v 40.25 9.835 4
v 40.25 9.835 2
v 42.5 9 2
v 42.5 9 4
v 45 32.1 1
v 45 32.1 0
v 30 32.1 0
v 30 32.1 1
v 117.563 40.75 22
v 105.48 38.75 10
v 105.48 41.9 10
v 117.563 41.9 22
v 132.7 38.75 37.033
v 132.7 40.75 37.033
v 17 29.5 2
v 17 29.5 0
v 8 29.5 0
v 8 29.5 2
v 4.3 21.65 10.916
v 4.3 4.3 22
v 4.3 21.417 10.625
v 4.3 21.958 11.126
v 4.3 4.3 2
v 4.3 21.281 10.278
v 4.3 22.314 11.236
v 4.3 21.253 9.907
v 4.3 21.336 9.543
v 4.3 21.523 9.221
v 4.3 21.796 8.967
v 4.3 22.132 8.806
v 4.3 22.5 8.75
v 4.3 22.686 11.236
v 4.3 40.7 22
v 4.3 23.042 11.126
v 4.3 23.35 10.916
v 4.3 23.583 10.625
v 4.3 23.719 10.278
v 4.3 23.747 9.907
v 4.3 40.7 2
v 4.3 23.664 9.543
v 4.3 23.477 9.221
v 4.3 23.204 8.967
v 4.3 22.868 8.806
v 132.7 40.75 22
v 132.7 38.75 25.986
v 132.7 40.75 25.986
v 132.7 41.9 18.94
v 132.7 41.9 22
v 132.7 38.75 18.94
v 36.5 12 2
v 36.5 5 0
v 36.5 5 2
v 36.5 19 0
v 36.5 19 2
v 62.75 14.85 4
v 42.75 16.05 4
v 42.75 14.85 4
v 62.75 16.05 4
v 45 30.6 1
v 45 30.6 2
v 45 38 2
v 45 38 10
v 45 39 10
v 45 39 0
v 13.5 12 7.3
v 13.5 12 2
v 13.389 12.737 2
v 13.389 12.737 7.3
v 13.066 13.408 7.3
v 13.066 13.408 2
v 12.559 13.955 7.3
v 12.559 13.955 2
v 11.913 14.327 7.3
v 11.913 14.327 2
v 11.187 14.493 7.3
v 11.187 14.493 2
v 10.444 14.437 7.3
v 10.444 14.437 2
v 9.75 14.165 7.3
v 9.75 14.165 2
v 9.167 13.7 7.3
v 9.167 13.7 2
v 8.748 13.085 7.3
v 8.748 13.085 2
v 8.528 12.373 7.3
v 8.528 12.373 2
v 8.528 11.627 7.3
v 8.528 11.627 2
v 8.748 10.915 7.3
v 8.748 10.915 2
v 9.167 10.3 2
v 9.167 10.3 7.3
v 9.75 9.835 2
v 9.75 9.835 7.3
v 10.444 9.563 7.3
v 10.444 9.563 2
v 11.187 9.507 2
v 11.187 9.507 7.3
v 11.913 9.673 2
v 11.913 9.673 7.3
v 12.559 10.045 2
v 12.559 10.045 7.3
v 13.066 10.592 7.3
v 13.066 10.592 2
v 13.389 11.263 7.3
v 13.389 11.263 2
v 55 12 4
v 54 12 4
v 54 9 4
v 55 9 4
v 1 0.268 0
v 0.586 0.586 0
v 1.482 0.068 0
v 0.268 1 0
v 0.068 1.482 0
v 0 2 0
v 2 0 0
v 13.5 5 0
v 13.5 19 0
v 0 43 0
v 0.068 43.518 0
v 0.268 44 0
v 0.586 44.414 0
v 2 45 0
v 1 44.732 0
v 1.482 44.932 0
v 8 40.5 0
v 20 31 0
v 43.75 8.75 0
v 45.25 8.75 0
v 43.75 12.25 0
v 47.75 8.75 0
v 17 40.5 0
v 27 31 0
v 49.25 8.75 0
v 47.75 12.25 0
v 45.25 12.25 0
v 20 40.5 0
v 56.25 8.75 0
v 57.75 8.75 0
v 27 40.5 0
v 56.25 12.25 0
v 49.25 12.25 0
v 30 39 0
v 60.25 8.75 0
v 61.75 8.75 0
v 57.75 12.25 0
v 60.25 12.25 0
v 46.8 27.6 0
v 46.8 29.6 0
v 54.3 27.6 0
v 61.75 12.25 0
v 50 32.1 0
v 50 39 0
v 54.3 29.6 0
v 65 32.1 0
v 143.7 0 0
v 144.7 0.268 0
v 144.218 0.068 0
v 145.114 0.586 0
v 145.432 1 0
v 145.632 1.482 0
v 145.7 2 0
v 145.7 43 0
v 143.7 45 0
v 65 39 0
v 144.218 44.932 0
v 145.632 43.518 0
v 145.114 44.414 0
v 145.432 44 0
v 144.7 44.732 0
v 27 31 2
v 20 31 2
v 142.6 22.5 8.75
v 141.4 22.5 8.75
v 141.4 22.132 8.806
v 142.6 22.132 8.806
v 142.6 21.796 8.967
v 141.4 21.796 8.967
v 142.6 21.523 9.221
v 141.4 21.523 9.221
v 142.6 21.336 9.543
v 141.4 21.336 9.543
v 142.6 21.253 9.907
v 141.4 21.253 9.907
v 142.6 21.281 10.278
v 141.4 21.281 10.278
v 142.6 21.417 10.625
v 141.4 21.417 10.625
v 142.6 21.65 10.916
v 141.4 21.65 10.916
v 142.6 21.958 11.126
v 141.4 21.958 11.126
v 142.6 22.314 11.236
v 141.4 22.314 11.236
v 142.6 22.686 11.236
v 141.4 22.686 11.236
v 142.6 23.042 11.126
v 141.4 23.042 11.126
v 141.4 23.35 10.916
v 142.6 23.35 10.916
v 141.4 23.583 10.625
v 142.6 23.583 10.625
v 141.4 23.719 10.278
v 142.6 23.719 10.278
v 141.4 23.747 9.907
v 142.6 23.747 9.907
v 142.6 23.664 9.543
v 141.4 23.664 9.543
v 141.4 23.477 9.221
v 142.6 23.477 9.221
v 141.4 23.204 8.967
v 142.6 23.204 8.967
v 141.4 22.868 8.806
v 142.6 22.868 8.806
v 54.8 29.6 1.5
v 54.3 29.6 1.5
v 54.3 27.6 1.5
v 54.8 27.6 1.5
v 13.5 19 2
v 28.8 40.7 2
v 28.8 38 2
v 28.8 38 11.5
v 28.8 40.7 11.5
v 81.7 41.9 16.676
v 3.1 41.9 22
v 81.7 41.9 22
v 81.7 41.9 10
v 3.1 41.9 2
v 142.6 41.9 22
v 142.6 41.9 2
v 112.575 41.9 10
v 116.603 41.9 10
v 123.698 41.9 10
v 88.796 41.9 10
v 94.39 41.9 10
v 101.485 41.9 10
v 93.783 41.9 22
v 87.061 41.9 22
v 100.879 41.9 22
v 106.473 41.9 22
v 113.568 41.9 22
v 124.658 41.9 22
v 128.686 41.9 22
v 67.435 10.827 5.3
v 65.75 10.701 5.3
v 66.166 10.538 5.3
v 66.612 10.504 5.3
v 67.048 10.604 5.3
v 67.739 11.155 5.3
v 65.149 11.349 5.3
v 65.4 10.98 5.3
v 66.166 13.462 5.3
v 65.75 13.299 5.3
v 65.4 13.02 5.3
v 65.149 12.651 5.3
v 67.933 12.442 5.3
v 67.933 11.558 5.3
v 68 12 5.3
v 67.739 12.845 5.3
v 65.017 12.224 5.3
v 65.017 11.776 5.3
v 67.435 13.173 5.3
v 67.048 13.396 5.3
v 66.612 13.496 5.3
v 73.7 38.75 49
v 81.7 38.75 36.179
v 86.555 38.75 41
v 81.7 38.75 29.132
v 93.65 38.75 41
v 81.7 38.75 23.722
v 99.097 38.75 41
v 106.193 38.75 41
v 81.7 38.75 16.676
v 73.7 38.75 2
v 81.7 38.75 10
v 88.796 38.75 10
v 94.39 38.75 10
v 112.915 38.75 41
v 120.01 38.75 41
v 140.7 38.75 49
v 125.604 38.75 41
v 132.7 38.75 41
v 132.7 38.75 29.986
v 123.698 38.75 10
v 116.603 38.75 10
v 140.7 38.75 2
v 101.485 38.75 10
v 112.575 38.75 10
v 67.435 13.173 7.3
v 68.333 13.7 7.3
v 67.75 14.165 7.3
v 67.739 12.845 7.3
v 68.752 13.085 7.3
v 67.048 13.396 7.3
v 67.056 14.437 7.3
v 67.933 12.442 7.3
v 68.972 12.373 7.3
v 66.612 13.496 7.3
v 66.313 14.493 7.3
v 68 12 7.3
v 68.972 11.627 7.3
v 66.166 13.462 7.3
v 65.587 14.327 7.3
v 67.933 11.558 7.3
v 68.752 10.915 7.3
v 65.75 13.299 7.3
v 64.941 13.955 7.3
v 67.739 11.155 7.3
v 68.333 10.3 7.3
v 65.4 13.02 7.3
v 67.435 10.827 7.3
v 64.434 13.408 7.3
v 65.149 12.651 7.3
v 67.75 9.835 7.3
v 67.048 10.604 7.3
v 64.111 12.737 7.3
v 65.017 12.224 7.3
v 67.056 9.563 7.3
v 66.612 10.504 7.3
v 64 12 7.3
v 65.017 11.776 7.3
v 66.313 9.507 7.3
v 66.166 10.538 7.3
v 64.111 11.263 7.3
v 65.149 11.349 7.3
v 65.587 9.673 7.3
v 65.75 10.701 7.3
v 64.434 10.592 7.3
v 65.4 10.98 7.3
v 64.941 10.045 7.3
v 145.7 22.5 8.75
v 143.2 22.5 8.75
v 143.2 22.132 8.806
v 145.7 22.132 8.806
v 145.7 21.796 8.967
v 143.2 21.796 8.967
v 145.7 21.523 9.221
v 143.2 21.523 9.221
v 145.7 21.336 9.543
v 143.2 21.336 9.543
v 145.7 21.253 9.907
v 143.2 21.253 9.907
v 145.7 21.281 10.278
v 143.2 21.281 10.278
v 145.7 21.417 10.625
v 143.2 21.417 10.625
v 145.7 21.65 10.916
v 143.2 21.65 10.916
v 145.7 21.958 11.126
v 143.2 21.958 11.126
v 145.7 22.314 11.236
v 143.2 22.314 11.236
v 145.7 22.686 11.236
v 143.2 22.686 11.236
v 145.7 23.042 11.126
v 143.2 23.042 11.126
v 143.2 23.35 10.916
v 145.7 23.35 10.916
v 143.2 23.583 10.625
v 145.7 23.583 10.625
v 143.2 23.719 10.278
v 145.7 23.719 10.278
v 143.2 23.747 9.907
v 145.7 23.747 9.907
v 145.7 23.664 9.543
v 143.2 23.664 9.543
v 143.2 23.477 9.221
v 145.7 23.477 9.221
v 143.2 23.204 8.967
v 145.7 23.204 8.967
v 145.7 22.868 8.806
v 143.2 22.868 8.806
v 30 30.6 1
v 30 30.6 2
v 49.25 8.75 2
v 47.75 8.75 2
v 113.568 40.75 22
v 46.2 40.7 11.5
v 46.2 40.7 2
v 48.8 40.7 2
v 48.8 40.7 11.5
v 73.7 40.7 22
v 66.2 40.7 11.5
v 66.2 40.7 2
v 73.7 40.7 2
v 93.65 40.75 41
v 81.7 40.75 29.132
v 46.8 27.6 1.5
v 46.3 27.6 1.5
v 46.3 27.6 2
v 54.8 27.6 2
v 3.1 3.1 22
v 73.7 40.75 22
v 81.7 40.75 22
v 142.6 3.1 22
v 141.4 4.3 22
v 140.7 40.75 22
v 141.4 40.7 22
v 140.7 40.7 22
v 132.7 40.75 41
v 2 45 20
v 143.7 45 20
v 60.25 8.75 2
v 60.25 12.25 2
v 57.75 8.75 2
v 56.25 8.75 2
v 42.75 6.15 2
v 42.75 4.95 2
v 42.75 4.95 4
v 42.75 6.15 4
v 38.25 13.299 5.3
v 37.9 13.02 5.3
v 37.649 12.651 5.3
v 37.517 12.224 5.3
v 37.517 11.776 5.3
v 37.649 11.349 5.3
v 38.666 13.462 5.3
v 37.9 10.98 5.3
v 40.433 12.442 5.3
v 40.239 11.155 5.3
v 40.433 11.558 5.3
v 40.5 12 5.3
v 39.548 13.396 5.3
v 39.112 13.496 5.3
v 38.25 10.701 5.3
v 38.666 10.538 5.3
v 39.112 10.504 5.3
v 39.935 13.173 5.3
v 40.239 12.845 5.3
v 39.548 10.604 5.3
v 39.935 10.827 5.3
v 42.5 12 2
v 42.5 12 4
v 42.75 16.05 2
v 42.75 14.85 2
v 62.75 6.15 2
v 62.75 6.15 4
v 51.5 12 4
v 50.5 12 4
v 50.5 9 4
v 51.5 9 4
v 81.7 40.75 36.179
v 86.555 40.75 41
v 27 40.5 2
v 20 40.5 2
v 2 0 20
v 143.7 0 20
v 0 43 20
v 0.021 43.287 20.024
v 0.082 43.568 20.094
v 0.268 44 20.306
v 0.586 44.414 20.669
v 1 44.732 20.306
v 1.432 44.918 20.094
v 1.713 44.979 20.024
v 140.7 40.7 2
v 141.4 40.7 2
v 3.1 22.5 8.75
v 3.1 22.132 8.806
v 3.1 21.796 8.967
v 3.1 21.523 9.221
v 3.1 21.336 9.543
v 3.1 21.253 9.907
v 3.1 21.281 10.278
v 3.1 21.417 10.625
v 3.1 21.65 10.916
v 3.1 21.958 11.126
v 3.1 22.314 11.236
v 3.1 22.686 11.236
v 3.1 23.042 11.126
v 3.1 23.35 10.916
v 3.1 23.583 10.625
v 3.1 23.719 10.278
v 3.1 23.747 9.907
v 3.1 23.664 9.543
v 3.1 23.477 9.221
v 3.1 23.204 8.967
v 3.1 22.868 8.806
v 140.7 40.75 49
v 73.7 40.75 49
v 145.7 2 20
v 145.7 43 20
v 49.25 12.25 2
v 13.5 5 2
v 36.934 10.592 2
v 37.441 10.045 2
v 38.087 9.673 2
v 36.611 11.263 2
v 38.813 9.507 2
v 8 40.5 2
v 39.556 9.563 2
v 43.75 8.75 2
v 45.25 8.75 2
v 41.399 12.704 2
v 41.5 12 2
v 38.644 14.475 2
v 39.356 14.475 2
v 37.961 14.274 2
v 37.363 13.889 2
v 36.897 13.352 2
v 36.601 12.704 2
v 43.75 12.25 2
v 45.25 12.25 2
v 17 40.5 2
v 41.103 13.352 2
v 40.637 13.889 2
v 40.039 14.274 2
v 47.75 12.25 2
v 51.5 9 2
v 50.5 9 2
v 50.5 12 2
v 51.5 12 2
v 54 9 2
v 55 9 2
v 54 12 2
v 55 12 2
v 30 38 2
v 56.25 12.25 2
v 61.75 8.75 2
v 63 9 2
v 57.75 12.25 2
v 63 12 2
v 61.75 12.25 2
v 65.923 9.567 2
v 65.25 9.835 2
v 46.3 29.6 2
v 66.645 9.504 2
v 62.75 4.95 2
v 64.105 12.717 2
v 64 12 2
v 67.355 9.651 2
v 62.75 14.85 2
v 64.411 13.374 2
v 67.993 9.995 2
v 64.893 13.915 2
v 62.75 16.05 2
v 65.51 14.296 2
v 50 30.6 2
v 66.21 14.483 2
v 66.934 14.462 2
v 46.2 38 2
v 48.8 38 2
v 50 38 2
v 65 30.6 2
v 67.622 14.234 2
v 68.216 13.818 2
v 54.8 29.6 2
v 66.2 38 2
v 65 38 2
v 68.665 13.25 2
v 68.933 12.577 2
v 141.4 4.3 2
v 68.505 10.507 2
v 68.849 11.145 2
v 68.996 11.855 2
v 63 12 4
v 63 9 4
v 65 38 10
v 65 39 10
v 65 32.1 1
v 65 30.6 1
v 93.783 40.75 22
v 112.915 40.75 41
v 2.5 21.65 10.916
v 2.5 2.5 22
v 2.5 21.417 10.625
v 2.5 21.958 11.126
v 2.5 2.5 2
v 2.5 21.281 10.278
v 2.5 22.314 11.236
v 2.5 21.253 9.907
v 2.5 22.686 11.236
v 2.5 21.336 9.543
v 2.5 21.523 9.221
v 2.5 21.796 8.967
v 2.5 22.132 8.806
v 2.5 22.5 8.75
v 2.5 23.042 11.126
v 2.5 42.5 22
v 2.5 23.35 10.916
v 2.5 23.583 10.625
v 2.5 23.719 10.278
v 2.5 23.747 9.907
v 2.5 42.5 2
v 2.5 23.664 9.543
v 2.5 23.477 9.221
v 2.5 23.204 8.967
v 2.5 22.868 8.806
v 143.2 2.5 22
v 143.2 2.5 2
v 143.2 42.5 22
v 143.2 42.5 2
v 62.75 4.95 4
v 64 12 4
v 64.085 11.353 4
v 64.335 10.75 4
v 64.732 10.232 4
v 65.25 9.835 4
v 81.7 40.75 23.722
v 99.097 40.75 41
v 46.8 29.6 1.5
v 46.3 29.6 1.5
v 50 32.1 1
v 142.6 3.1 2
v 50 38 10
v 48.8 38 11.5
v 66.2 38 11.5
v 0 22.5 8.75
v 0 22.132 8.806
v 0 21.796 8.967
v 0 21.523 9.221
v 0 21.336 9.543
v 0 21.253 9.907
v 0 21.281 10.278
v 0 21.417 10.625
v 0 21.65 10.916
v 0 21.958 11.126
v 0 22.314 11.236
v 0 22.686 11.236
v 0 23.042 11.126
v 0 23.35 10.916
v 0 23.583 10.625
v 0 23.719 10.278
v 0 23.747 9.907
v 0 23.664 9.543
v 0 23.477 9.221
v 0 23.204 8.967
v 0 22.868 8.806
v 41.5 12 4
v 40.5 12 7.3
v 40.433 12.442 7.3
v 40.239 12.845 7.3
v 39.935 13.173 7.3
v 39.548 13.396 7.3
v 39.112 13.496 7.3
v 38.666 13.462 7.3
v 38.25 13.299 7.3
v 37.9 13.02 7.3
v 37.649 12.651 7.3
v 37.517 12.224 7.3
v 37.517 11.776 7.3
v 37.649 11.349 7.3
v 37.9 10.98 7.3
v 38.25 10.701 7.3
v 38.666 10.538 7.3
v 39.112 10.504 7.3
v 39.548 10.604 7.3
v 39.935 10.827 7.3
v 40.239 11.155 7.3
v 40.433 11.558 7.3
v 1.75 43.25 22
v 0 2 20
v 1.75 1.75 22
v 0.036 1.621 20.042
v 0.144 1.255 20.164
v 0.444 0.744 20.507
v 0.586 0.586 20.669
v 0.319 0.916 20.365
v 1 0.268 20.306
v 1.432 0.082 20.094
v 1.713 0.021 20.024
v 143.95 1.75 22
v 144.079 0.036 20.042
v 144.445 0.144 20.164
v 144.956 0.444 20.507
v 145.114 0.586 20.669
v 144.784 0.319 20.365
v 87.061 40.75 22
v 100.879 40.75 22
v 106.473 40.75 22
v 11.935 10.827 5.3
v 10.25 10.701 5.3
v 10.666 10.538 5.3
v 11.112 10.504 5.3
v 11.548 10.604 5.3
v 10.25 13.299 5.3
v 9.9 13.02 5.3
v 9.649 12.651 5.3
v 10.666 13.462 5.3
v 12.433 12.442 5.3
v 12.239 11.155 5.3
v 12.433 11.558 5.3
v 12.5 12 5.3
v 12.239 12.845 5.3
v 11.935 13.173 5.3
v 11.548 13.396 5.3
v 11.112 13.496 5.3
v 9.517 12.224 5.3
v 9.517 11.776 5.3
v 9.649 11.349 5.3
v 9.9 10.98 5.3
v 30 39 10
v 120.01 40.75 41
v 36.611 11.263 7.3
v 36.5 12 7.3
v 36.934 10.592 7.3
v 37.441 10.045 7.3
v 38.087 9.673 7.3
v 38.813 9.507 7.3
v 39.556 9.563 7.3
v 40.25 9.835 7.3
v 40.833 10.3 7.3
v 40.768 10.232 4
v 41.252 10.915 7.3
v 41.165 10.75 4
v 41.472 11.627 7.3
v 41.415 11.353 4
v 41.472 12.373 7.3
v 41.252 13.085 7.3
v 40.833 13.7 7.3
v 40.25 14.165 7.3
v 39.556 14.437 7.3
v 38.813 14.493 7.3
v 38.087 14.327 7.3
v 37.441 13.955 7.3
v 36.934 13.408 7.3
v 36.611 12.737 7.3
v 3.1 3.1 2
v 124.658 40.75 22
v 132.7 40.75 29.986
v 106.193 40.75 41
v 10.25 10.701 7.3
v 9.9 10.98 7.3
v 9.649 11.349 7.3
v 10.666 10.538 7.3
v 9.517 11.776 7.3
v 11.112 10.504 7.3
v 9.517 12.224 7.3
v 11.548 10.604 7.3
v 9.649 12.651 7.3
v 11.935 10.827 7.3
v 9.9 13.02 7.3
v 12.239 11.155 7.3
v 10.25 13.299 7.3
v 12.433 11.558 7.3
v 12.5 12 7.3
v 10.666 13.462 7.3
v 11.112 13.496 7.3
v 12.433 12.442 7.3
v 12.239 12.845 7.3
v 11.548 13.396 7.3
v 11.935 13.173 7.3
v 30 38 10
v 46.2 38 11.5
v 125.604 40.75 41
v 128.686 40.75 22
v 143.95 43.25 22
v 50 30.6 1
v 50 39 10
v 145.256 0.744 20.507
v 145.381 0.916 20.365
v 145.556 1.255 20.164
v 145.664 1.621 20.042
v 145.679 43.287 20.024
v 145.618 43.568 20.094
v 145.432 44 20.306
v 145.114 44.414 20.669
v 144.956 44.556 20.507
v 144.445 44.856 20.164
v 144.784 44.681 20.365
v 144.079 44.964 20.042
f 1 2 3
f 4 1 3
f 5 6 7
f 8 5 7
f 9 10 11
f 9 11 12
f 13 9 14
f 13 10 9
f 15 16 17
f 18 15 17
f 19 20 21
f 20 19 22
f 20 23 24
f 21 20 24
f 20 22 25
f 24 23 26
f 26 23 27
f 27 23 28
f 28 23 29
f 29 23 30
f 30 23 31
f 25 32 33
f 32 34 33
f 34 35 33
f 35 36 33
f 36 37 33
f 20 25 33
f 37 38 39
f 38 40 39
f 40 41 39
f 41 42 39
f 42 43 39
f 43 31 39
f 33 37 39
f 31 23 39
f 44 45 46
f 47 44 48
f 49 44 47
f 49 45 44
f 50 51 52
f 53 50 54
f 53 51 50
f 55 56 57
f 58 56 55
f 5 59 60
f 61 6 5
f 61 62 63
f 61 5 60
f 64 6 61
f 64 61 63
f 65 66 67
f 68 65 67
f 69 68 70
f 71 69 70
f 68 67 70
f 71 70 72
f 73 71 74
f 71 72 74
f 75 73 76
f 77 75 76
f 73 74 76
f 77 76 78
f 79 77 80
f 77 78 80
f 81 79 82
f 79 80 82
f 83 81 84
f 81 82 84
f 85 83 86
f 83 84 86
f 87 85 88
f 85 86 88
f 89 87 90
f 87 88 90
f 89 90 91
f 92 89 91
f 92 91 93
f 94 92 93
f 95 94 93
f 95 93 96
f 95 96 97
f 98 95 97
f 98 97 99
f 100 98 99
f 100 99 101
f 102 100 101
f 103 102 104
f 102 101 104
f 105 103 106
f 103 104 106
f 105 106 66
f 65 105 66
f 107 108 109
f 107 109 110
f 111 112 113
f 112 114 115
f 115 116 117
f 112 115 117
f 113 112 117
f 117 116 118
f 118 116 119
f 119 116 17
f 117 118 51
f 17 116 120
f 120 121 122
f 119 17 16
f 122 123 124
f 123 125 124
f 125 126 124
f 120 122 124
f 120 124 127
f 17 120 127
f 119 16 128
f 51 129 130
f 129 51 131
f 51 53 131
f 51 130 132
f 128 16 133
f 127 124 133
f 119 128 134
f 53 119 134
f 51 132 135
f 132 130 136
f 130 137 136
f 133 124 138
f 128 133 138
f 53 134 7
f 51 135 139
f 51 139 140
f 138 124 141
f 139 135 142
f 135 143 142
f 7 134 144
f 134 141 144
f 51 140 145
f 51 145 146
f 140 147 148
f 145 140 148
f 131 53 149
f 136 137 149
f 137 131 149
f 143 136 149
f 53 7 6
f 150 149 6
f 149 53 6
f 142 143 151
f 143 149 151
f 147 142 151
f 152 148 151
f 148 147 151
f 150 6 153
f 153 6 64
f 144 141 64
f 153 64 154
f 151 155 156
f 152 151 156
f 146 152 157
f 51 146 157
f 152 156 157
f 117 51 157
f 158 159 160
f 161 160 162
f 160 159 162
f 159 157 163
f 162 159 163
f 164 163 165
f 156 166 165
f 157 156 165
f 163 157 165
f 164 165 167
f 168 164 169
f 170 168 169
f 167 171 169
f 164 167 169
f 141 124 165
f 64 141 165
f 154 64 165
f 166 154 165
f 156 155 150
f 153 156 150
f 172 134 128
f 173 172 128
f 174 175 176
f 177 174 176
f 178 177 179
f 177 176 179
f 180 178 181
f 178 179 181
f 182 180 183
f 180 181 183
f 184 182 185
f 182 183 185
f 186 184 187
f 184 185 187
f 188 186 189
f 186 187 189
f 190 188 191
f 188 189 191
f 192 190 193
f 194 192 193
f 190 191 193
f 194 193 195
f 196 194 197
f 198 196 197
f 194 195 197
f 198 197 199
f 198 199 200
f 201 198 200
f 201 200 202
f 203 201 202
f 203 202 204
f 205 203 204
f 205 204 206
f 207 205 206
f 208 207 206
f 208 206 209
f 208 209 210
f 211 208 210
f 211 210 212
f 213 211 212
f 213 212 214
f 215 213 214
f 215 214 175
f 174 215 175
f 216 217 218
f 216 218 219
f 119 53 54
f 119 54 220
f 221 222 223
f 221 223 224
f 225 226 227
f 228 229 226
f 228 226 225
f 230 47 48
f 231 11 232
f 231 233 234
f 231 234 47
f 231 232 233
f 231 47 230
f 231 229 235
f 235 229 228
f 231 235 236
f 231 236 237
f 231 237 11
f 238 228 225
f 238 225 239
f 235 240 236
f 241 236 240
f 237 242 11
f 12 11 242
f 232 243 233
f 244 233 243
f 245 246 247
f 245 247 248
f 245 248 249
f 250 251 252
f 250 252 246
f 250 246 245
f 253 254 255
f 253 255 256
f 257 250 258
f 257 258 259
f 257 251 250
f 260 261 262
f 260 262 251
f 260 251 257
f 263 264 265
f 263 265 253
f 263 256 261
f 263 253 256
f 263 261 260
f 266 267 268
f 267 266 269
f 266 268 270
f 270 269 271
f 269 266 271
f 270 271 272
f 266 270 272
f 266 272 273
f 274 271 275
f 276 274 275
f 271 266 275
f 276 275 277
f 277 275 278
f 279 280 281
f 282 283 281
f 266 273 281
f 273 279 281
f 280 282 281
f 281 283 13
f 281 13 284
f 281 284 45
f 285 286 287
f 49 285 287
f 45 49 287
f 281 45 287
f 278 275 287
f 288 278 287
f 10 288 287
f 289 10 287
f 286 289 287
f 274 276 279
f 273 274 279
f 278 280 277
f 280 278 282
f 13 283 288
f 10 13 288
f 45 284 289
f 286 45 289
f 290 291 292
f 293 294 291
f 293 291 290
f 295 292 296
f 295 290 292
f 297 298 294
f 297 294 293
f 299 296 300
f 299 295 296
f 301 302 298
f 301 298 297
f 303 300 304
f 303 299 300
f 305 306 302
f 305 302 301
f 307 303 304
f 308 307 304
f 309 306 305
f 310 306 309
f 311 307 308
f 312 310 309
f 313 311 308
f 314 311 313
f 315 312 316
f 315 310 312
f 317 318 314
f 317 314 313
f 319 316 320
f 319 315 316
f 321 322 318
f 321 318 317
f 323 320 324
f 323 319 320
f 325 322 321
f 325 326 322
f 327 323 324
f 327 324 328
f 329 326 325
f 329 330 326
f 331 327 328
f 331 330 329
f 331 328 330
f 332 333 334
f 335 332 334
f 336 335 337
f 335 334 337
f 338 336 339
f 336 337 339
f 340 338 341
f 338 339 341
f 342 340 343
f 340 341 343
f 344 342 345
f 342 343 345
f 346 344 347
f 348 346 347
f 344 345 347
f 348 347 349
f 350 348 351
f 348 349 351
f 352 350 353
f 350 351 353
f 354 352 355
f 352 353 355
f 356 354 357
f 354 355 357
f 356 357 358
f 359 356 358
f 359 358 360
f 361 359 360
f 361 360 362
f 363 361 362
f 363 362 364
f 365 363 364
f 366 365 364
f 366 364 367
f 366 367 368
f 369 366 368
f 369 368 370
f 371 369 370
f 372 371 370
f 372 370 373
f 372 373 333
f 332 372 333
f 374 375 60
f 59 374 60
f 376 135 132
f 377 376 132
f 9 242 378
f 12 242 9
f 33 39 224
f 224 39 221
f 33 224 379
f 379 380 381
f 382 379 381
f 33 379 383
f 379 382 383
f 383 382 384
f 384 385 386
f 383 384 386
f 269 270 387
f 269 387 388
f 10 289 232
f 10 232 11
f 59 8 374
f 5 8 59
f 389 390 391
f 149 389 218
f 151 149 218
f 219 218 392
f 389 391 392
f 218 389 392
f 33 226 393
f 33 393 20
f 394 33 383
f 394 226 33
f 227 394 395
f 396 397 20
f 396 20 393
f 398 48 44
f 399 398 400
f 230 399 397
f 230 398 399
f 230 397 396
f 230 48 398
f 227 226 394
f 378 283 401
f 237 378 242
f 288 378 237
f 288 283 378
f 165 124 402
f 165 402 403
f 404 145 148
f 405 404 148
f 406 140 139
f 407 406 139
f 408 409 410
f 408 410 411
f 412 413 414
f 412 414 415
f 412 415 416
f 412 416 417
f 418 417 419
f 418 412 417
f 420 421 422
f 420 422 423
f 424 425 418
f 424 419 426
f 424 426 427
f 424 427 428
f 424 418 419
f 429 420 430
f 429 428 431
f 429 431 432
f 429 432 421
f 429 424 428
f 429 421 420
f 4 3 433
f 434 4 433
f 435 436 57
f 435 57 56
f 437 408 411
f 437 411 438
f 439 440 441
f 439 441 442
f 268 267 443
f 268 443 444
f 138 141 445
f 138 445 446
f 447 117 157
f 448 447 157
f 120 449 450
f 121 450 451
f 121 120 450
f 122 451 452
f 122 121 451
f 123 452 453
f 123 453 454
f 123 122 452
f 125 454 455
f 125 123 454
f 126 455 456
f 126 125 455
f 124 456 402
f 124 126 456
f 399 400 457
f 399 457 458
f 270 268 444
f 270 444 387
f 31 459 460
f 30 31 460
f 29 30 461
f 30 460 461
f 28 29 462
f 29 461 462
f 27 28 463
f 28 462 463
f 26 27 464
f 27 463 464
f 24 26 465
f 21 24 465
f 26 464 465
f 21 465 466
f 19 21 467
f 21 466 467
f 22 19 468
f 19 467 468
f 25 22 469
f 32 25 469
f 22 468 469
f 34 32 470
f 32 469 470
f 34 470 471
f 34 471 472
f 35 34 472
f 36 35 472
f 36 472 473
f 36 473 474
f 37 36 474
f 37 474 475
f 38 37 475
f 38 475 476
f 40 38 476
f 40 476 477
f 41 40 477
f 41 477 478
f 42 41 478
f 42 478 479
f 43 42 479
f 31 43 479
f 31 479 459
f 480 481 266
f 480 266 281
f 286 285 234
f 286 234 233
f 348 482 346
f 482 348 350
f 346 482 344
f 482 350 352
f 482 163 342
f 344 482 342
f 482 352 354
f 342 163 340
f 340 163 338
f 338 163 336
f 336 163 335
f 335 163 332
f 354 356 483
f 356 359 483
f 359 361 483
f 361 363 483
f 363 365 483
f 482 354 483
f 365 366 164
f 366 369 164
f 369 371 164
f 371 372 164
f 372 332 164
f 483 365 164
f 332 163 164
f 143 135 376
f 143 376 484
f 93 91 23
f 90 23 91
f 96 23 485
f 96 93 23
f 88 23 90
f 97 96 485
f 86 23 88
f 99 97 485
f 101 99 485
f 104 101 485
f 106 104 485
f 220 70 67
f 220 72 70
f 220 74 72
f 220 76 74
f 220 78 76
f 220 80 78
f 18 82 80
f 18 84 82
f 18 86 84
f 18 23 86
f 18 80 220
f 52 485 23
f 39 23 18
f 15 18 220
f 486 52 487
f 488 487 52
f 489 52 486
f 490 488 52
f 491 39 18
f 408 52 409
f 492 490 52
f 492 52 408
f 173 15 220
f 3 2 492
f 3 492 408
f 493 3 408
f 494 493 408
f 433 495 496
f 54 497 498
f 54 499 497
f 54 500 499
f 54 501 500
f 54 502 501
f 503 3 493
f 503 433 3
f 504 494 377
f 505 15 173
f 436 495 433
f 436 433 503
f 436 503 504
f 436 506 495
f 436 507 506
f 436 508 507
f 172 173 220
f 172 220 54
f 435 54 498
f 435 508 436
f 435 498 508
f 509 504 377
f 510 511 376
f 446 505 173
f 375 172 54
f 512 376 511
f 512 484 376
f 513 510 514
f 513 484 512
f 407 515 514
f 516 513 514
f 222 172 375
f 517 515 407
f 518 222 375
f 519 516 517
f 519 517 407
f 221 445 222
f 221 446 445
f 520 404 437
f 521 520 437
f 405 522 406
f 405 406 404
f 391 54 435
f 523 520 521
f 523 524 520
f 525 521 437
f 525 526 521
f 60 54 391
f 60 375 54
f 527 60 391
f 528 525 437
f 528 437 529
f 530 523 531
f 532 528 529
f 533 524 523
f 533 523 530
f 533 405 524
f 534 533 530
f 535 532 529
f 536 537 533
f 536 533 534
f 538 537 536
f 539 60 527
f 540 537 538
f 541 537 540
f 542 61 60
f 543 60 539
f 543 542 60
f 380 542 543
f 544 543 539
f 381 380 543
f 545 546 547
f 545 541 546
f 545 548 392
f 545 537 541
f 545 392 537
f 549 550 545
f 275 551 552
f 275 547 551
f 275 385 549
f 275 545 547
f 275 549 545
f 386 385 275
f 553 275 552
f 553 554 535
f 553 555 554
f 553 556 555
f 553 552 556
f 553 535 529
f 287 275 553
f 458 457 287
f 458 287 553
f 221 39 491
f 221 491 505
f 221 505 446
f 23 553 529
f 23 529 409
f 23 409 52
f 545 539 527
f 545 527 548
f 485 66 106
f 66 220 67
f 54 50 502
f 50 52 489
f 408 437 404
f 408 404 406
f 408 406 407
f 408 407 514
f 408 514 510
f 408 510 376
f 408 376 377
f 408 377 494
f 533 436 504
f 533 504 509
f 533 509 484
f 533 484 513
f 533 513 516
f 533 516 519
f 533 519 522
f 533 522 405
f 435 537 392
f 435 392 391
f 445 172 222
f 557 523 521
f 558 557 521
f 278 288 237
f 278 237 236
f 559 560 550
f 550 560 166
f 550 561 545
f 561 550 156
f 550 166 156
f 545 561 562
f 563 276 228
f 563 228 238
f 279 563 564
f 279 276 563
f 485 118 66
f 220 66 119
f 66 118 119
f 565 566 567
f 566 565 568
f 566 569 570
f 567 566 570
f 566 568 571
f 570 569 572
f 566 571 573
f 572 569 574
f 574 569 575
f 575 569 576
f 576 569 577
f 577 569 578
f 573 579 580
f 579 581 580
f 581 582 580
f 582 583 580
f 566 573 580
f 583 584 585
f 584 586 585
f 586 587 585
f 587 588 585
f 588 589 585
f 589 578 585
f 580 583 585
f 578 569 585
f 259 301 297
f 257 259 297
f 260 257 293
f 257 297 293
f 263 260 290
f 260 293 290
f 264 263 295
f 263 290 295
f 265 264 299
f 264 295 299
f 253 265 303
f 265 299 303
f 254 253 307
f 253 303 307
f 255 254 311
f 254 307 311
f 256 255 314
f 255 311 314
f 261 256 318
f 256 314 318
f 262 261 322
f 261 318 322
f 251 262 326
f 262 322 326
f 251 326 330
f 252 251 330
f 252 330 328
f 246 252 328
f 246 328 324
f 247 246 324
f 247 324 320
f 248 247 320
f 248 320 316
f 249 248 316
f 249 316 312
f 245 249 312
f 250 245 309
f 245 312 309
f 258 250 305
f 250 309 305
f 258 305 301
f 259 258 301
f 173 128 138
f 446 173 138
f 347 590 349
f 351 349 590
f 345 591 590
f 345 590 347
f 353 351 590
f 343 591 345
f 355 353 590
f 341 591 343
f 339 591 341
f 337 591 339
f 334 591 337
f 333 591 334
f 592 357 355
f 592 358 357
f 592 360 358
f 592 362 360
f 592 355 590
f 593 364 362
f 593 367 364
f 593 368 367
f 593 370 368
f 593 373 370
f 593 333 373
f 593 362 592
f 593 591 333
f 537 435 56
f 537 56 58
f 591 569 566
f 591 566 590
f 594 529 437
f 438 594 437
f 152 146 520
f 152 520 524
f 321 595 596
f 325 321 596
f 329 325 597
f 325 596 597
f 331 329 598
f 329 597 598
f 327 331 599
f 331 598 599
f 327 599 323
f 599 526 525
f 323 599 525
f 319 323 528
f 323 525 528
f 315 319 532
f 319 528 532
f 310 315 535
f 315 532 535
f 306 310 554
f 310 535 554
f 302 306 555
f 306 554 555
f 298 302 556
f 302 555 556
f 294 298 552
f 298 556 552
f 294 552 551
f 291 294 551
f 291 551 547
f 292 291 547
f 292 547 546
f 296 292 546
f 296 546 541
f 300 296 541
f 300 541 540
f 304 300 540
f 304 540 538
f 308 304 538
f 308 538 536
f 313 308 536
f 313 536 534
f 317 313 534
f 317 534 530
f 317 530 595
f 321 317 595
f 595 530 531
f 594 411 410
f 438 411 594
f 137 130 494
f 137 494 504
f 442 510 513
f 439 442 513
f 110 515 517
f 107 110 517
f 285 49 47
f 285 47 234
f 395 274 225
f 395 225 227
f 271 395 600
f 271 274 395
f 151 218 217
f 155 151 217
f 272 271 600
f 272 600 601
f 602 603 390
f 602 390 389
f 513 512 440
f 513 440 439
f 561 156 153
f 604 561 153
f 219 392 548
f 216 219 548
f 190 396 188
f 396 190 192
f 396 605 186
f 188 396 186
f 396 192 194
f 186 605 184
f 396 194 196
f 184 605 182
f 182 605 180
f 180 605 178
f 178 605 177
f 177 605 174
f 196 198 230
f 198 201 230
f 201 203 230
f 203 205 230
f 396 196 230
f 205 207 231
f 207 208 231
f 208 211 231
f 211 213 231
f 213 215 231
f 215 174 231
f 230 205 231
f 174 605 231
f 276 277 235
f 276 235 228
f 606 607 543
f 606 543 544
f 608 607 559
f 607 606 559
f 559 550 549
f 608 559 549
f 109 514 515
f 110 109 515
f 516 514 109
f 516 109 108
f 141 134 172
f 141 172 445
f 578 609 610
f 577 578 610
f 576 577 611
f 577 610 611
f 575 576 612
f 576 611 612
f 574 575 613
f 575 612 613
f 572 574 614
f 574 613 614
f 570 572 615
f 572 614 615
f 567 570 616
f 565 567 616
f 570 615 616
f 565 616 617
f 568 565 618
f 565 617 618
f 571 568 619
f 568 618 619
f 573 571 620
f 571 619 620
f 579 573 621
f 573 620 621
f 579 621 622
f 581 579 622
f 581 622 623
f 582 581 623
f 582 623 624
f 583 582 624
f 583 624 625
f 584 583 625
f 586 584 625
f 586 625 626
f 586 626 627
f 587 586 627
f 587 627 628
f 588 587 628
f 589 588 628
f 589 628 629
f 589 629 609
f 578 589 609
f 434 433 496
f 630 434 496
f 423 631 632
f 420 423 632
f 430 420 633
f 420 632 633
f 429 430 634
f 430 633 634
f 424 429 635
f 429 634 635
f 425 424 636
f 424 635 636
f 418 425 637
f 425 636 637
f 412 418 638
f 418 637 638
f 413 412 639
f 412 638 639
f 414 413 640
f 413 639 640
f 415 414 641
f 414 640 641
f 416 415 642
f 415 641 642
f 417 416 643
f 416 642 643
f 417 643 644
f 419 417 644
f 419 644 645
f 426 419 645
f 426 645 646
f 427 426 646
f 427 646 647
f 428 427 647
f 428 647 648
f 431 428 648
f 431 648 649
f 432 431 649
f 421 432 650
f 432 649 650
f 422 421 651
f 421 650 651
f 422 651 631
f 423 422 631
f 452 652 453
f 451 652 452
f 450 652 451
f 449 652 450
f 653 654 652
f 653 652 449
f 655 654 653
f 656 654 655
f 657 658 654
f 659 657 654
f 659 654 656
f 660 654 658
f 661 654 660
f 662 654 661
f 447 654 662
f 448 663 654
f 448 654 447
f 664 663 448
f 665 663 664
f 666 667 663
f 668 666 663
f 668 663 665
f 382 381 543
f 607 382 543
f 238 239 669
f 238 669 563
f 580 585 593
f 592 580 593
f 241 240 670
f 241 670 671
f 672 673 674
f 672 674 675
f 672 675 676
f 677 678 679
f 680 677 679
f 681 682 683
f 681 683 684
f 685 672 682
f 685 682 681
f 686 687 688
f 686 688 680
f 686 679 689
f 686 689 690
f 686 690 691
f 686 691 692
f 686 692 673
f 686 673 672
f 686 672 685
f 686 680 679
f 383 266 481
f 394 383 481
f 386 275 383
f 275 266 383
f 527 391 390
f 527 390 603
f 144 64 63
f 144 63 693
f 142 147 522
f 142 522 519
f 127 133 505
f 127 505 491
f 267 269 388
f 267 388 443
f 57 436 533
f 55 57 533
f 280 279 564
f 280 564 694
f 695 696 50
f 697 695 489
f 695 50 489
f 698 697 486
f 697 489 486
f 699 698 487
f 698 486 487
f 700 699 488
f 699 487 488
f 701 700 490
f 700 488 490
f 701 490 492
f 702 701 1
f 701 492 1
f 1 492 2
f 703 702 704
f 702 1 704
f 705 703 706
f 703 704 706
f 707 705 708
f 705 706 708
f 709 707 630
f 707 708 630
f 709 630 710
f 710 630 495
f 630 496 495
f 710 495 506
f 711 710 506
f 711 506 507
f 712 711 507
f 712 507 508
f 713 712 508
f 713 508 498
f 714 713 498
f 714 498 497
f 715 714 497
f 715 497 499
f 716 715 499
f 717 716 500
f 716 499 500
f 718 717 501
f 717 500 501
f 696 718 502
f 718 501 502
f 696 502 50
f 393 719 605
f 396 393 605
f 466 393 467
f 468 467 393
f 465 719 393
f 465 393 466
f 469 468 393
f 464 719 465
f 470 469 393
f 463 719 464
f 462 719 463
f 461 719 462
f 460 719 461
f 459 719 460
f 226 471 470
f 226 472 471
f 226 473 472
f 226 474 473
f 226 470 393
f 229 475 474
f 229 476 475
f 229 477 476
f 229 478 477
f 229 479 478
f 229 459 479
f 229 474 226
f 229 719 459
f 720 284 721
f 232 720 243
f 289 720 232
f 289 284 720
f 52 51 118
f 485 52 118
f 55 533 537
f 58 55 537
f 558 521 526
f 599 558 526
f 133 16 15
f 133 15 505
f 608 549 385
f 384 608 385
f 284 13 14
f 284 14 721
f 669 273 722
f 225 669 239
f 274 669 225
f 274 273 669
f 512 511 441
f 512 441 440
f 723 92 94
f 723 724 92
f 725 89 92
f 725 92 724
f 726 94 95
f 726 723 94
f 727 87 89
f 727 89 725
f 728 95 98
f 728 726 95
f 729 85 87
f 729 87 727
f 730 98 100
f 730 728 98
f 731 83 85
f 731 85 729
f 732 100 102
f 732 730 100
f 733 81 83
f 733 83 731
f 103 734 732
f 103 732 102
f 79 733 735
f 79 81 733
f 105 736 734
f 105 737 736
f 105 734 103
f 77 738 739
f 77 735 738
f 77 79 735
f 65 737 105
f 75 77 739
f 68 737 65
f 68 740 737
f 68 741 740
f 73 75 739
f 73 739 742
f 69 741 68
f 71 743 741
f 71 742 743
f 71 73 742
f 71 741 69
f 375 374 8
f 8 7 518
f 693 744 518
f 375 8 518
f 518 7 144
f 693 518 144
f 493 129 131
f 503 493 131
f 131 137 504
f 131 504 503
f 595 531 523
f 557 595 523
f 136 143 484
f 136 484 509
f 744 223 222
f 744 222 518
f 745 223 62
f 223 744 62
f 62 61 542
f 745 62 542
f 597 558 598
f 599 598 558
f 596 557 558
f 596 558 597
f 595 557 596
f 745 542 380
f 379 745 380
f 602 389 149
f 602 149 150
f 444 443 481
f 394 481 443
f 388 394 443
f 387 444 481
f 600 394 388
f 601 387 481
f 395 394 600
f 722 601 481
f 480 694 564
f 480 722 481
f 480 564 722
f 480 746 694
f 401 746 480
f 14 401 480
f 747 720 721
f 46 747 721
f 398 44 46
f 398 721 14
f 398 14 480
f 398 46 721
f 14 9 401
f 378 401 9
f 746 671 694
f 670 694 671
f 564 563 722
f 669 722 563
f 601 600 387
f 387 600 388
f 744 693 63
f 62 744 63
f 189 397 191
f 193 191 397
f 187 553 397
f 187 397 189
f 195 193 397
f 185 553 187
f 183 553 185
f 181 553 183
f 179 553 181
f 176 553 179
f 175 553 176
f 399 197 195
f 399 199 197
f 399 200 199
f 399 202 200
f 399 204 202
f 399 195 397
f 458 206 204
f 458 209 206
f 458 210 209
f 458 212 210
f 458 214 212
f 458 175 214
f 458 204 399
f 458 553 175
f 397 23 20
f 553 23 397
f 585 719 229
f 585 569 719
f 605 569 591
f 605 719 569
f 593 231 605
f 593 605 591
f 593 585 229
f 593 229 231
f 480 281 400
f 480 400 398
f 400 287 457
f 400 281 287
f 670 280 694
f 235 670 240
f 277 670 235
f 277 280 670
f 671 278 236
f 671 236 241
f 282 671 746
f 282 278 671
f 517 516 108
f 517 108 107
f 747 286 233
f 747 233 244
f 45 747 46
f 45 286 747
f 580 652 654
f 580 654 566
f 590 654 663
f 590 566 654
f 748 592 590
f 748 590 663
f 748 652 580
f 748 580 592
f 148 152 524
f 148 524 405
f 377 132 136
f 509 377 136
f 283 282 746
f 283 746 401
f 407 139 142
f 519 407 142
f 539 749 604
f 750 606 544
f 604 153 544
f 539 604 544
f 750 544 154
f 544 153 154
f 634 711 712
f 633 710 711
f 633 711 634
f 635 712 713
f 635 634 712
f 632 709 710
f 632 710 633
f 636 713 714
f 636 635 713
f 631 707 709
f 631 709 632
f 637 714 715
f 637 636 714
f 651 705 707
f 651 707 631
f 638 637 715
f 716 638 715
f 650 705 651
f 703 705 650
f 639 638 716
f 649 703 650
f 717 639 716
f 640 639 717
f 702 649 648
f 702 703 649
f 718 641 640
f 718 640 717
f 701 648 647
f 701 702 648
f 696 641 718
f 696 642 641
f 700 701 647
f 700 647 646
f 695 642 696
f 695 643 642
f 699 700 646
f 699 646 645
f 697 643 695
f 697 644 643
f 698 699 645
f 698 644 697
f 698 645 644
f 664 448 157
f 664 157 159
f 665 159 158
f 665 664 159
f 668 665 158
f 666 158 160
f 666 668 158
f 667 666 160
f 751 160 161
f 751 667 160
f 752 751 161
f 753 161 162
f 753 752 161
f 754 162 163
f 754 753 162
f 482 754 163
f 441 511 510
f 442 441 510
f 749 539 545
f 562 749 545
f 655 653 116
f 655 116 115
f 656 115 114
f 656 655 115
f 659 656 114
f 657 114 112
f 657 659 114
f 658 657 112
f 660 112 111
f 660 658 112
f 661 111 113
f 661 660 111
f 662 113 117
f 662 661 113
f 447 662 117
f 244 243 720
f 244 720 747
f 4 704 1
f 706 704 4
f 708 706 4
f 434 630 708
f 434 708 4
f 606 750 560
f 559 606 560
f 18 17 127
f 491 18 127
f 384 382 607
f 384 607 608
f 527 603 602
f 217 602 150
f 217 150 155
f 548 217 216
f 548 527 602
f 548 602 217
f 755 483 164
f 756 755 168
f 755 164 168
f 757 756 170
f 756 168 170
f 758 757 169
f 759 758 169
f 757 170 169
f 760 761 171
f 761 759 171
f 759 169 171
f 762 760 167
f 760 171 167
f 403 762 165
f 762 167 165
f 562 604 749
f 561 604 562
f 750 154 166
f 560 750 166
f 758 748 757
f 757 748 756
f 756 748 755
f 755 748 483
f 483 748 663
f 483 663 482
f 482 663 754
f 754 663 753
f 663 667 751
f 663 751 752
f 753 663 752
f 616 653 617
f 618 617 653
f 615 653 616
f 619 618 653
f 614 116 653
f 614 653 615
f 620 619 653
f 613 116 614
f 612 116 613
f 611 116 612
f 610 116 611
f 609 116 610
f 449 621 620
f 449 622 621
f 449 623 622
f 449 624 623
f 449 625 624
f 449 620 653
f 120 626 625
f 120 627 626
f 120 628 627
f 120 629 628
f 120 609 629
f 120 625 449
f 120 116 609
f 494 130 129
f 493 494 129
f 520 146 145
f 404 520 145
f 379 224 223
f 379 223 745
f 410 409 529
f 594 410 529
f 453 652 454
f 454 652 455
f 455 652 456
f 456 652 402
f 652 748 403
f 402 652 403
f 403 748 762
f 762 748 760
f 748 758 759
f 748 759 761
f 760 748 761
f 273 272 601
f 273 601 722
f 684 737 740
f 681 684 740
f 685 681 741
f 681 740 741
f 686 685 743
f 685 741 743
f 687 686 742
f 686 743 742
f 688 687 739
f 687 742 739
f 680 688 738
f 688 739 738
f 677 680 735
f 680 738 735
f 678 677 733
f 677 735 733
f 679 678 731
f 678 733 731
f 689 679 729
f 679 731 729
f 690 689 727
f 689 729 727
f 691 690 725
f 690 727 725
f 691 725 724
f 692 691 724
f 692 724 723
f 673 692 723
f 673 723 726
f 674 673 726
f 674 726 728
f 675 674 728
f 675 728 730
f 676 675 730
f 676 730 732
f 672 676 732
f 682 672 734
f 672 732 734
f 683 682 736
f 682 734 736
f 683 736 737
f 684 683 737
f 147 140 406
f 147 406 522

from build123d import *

# Parameters (mm, degrees)
SKETCH1_W                = 145.7
SKETCH1_H                = 45
BOSS_EXTRUDE1_DEPTH      = 2
USB_REACH                = 154.504
SKETCH2_W                = 15
SKETCH2_H                = 6.9
SKETCH3_W                = 15
SKETCH3_H                = 8.4
USB_BACK_DEPTH           = 1
USB_BACK_SUPPORT_DEPTH   = 8
SKETCH5_W                = 17.4
SKETCH5_H                = 3
USB_BACK_SUPPORT_2_DEPTH = 1.5
VOLTMETER_HOLE_REACH     = 154.924
SKETCH6_W                = 23
SKETCH6_H                = 14
SKETCH7_R                = 2.5
VOLTMETER_PLOT_DEPTH     = 5.3
SKETCH10_R               = 1.5
PLOT_HOLE_DEPTH          = 2
SKETCH8_W                = 67
SKETCH8_H                = 2
BOSS_EXTRUDE5_DEPTH      = 47
DC_REACH                 = 162.17
SKETCH9_W                = 7
SKETCH9_H                = 9.5
SKETCH9_W_2              = 9
SKETCH9_H_2              = 11
SWITCH_HOLA_REACH        = 162.17
SKETCH11_W               = 1.5
SKETCH11_H               = 3.5
SKETCH12_W               = 20
SKETCH12_H               = 1.2
SKETCH12_W_2             = 1
SKETCH12_H_2             = 3
SWITCH_BLOCK_DEPTH       = 2
TROU_ROULETTE_REACH      = 161.57
SKETCH15_W               = 7.5
SKETCH15_H               = 2
SKETCH16_W               = 8.5
SKETCH16_H               = 2
CUT_EXTRUDE2_DEPTH       = 0.5
SKETCH17_W               = 145.7
SKETCH17_H               = 45
SKETCH17_W_2             = 140.7
SKETCH17_H_2             = 40
SKETCH17_W_3             = 139.5
SKETCH17_H_3             = 38.8
SKETCH17_W_4             = 137.1
SKETCH17_H_4             = 36.4
BORD_DEPTH               = 20
FILLET1_R                = 2
CUT_EXTRUDE3_REACH       = 160.528
CUT_EXTRUDE4_REACH       = 162.17
CUT_EXTRUDE5_REACH       = 162.17
CUT_EXTRUDE6_REACH       = 162.17
SKETCH21_R               = 1.25


with BuildPart() as part:
    # Sketch1 → Boss-Extrude1 (new body)
    with BuildSketch(Plane.XY):
        with Locations((72.85, 22.5)):
            Rectangle(SKETCH1_W, SKETCH1_H)
    extrude(amount=BOSS_EXTRUDE1_DEPTH)

    # Sketch2 → usb (cut, up to next)
    with BuildSketch(Plane(origin=(0, 0, 0), x_dir=(-1, 0, 0), z_dir=(0, 0, -1)), mode=Mode.PRIVATE) as usb_sk1:
        with Locations((-37.5, 35.55)):
            Rectangle(SKETCH2_W, SKETCH2_H)
    usb_tool1 = extrude(usb_sk1.sketch, amount=-USB_REACH, mode=Mode.PRIVATE) & part.part
    # Sketch2 → usb (cut, up to next)
    with BuildSketch(Plane(origin=(0, 0, 0), x_dir=(-1, 0, 0), z_dir=(0, 0, -1)), mode=Mode.PRIVATE) as usb_sk2:
        with Locations((-57.5, 35.55)):
            Rectangle(SKETCH2_W, SKETCH2_H)
    usb_tool2 = extrude(usb_sk2.sketch, amount=-USB_REACH, mode=Mode.PRIVATE) & part.part
    add(usb_tool1.solids().sort_by_distance((37.5, 35.55, 0))[0], mode=Mode.SUBTRACT)
    add(usb_tool2.solids().sort_by_distance((57.5, 35.55, 0))[0], mode=Mode.SUBTRACT)

    # Sketch3 → usb_back (cut)
    with BuildSketch(Plane.XY.offset(2)):
        with Locations((37.5, 34.8)):
            Rectangle(SKETCH3_W, SKETCH3_H)
        with Locations((57.5, 34.8)):
            Rectangle(SKETCH3_W, SKETCH3_H)
    extrude(amount=-USB_BACK_DEPTH, mode=Mode.SUBTRACT)

    # Sketch4 → usb_back_support (add)
    with BuildSketch(Plane.XY.offset(2)):
        Polygon((65, 39), (65, 38), (66.2, 38), (66.2, 41), (48.8, 41), (48.8, 38), (50, 38), (50, 39), align=None)
        Polygon((45, 39), (45, 38), (46.2, 38), (46.2, 41), (28.8, 41), (28.8, 38), (30, 38), (30, 39), align=None)
    extrude(amount=USB_BACK_SUPPORT_DEPTH)

    # Sketch5 → usb_back_support_2 (add)
    with BuildSketch(Plane.XY.offset(10)):
        with Locations((37.5, 39.5)):
            Rectangle(SKETCH5_W, SKETCH5_H)
        with Locations((57.5, 39.5)):
            Rectangle(SKETCH5_W, SKETCH5_H)
    extrude(amount=USB_BACK_SUPPORT_2_DEPTH)

    # Sketch6 → voltmeter_hole (cut, up to next)
    with BuildSketch(Plane(origin=(0, 0, 0), x_dir=(-1, 0, 0), z_dir=(0, 0, -1)), mode=Mode.PRIVATE) as voltmeter_hole_sk1:
        with Locations((-25, 12)):
            Rectangle(SKETCH6_W, SKETCH6_H)
    voltmeter_hole_tool1 = extrude(voltmeter_hole_sk1.sketch, amount=-VOLTMETER_HOLE_REACH, mode=Mode.PRIVATE) & part.part
    add(voltmeter_hole_tool1.solids().sort_by_distance((25, 12, 0))[0], mode=Mode.SUBTRACT)

    # Sketch7 → voltmeter_plot (add)
    with BuildSketch(Plane.XY.offset(2)):
        with Locations(Location((66.5, 12, 0), (0, 0, 180))):
            Circle(SKETCH7_R)
        with Locations(Location((39, 12, 0), (0, 0, 180))):
            Circle(SKETCH7_R)
        with Locations((11, 12)):
            Circle(SKETCH7_R)
    extrude(amount=VOLTMETER_PLOT_DEPTH)

    # Sketch10 → plot_hole (cut)
    with BuildSketch(Plane.XY.offset(7.3)):
        with Locations((66.5, 12)):
            Circle(SKETCH10_R)
        with Locations((39, 12)):
            Circle(SKETCH10_R)
        with Locations((11, 12)):
            Circle(SKETCH10_R)
    extrude(amount=-PLOT_HOLE_DEPTH, mode=Mode.SUBTRACT)

    # Sketch8 → Boss-Extrude5 (add)
    with BuildSketch(Plane.XY.offset(2)):
        with Locations((107.2, 39.75)):
            Rectangle(SKETCH8_W, SKETCH8_H)
    extrude(amount=BOSS_EXTRUDE5_DEPTH)

    # Sketch9 → dc (cut, up to next)
    with BuildSketch(Plane(origin=(0, 0, 0), x_dir=(-1, 0, 0), z_dir=(0, 0, -1)), mode=Mode.PRIVATE) as dc_sk1:
        with Locations((-23.5, 35.75)):
            Rectangle(SKETCH9_W, SKETCH9_H)
    dc_tool1 = extrude(dc_sk1.sketch, amount=-DC_REACH, mode=Mode.PRIVATE) & part.part
    # Sketch9 → dc (cut, up to next)
    with BuildSketch(Plane(origin=(0, 0, 0), x_dir=(-1, 0, 0), z_dir=(0, 0, -1)), mode=Mode.PRIVATE) as dc_sk2:
        with Locations((-12.5, 35)):
            Rectangle(SKETCH9_W_2, SKETCH9_H_2)
    dc_tool2 = extrude(dc_sk2.sketch, amount=-DC_REACH, mode=Mode.PRIVATE) & part.part
    add(dc_tool1.solids().sort_by_distance((23.5, 35.75, 0))[0], mode=Mode.SUBTRACT)
    add(dc_tool2.solids().sort_by_distance((12.5, 35, 0))[0], mode=Mode.SUBTRACT)

    # Sketch11 → switch_hola (cut, up to next)
    with BuildSketch(Plane(origin=(0, 0, 0), x_dir=(-1, 0, 0), z_dir=(0, 0, -1)), mode=Mode.PRIVATE) as switch_hola_sk1:
        with Locations((-44.5, 10.5)):
            Rectangle(SKETCH11_W, SKETCH11_H)
    switch_hola_tool1 = extrude(switch_hola_sk1.sketch, amount=-SWITCH_HOLA_REACH, mode=Mode.PRIVATE) & part.part
    # Sketch11 → switch_hola (cut, up to next)
    with BuildSketch(Plane(origin=(0, 0, 0), x_dir=(-1, 0, 0), z_dir=(0, 0, -1)), mode=Mode.PRIVATE) as switch_hola_sk2:
        with Locations((-48.5, 10.5)):
            Rectangle(SKETCH11_W, SKETCH11_H)
    switch_hola_tool2 = extrude(switch_hola_sk2.sketch, amount=-SWITCH_HOLA_REACH, mode=Mode.PRIVATE) & part.part
    # Sketch11 → switch_hola (cut, up to next)
    with BuildSketch(Plane(origin=(0, 0, 0), x_dir=(-1, 0, 0), z_dir=(0, 0, -1)), mode=Mode.PRIVATE) as switch_hola_sk3:
        with Locations((-57, 10.5)):
            Rectangle(SKETCH11_W, SKETCH11_H)
    switch_hola_tool3 = extrude(switch_hola_sk3.sketch, amount=-SWITCH_HOLA_REACH, mode=Mode.PRIVATE) & part.part
    # Sketch11 → switch_hola (cut, up to next)
    with BuildSketch(Plane(origin=(0, 0, 0), x_dir=(-1, 0, 0), z_dir=(0, 0, -1)), mode=Mode.PRIVATE) as switch_hola_sk4:
        with Locations((-61, 10.5)):
            Rectangle(SKETCH11_W, SKETCH11_H)
    switch_hola_tool4 = extrude(switch_hola_sk4.sketch, amount=-SWITCH_HOLA_REACH, mode=Mode.PRIVATE) & part.part
    add(switch_hola_tool1.solids().sort_by_distance((44.5, 10.5, 0))[0], mode=Mode.SUBTRACT)
    add(switch_hola_tool2.solids().sort_by_distance((48.5, 10.5, 0))[0], mode=Mode.SUBTRACT)
    add(switch_hola_tool3.solids().sort_by_distance((57, 10.5, 0))[0], mode=Mode.SUBTRACT)
    add(switch_hola_tool4.solids().sort_by_distance((61, 10.5, 0))[0], mode=Mode.SUBTRACT)

    # Sketch12 → switch_block (add)
    with BuildSketch(Plane.XY.offset(2)):
        with Locations((52.75, 15.45)):
            Rectangle(SKETCH12_W, SKETCH12_H)
        Polygon((65.25, 12), (63, 12), (63, 9), (65.25, 9.834936491), align=None)
        with Locations((54.5, 10.5)):
            Rectangle(SKETCH12_W_2, SKETCH12_H_2)
        with Locations((51, 10.5)):
            Rectangle(SKETCH12_W_2, SKETCH12_H_2)
        Polygon((42.5, 9), (42.5, 12), (40.25, 12), (40.25, 9.834936491), align=None)
        with Locations((52.75, 5.55)):
            Rectangle(SKETCH12_W, SKETCH12_H)
    extrude(amount=SWITCH_BLOCK_DEPTH)

    # Sketch15 → trou roulette (cut, up to next)
    with BuildSketch(Plane.XY.offset(2), mode=Mode.PRIVATE) as trou_roulette_sk1:
        with Locations((50.55, 28.6)):
            Rectangle(SKETCH15_W, SKETCH15_H)
    trou_roulette_tool1 = extrude(trou_roulette_sk1.sketch, amount=-TROU_ROULETTE_REACH, mode=Mode.PRIVATE) & part.part
    add(trou_roulette_tool1.solids().sort_by_distance((50.55, 28.6, 2))[0], mode=Mode.SUBTRACT)

    # Sketch16 → Cut-Extrude2 (cut)
    with BuildSketch(Plane.XY.offset(2)):
        with Locations((50.55, 28.6)):
            Rectangle(SKETCH16_W, SKETCH16_H)
    extrude(amount=-CUT_EXTRUDE2_DEPTH, mode=Mode.SUBTRACT)

    # Sketch17 → bord (add)
    # profile 1 of 2: a face of its own
    with BuildSketch(Plane.XY.offset(2)):
        with Locations((72.85, 22.5)):
            Rectangle(SKETCH17_W, SKETCH17_H)
        with Locations((72.85, 22.5)):
            Rectangle(SKETCH17_W_2, SKETCH17_H_2, mode=Mode.SUBTRACT)
    # profile 2 of 2: a face of its own
    with BuildSketch(Plane.XY.offset(2)):
        with Locations((72.85, 22.5)):
            Rectangle(SKETCH17_W_3, SKETCH17_H_3)
        with Locations((72.85, 22.5)):
            Rectangle(SKETCH17_W_4, SKETCH17_H_4, mode=Mode.SUBTRACT)
    extrude(amount=BORD_DEPTH)

    # Fillet1
    fillet1_edges = [part.edges().sort_by_distance(p)[0] for p in [
        (0, 45, 11),
        (145.7, 45, 11),
        (145.7, 0, 11),
        (0, 0, 11),
    ]]
    fillet(fillet1_edges, radius=FILLET1_R)

    # Cut-Extrude3: up to this face of the body (flat: up to its plane)
    cut_extrude3_end = Plane(part.part.faces().sort_by_distance((72.85, 41.9, 12))[0])
    # Sketch18 → Cut-Extrude3 (cut, up to the picked face)
    with BuildSketch(Plane.XZ.offset(-38.75), mode=Mode.PRIVATE) as cut_extrude3_sk1:
        Polygon((81.7, 36.178535443), (86.554874827, 41), (93.650484366, 41), (81.7, 29.131756459), align=None)
    cut_extrude3_tool1 = split(extrude(cut_extrude3_sk1.sketch, amount=-CUT_EXTRUDE3_REACH, mode=Mode.PRIVATE), bisect_by=cut_extrude3_end, keep=Keep.BOTH, mode=Mode.PRIVATE)
    # Sketch18 → Cut-Extrude3 (cut, up to the picked face)
    with BuildSketch(Plane.XZ.offset(-38.75), mode=Mode.PRIVATE) as cut_extrude3_sk2:
        Polygon((81.7, 23.722435448), (99.09728919, 41), (106.192898729, 41), (81.7, 16.675656464), align=None)
    cut_extrude3_tool2 = split(extrude(cut_extrude3_sk2.sketch, amount=-CUT_EXTRUDE3_REACH, mode=Mode.PRIVATE), bisect_by=cut_extrude3_end, keep=Keep.BOTH, mode=Mode.PRIVATE)
    # Sketch18 → Cut-Extrude3 (cut, up to the picked face)
    with BuildSketch(Plane.XZ.offset(-38.75), mode=Mode.PRIVATE) as cut_extrude3_sk3:
        Polygon((81.7, 10), (112.91481406, 41), (120.010423599, 41), (88.795609539, 10), align=None)
    cut_extrude3_tool3 = split(extrude(cut_extrude3_sk3.sketch, amount=-CUT_EXTRUDE3_REACH, mode=Mode.PRIVATE), bisect_by=cut_extrude3_end, keep=Keep.BOTH, mode=Mode.PRIVATE)
    # Sketch18 → Cut-Extrude3 (cut, up to the picked face)
    with BuildSketch(Plane.XZ.offset(-38.75), mode=Mode.PRIVATE) as cut_extrude3_sk4:
        Polygon((94.389576401, 10), (125.604390461, 41), (132.7, 41), (101.48518594, 10), align=None)
    cut_extrude3_tool4 = split(extrude(cut_extrude3_sk4.sketch, amount=-CUT_EXTRUDE3_REACH, mode=Mode.PRIVATE), bisect_by=cut_extrude3_end, keep=Keep.BOTH, mode=Mode.PRIVATE)
    # Sketch18 → Cut-Extrude3 (cut, up to the picked face)
    with BuildSketch(Plane.XZ.offset(-38.75), mode=Mode.PRIVATE) as cut_extrude3_sk5:
        Polygon((105.479535572, 10), (132.7, 37.033138678), (132.7, 29.986359693), (112.575145111, 10), align=None)
    cut_extrude3_tool5 = split(extrude(cut_extrude3_sk5.sketch, amount=-CUT_EXTRUDE3_REACH, mode=Mode.PRIVATE), bisect_by=cut_extrude3_end, keep=Keep.BOTH, mode=Mode.PRIVATE)
    # Sketch18 → Cut-Extrude3 (cut, up to the picked face)
    with BuildSketch(Plane.XZ.offset(-38.75), mode=Mode.PRIVATE) as cut_extrude3_sk6:
        Polygon((116.602863055, 10), (132.7, 25.986359693), (132.7, 18.939580709), (123.698472594, 10), align=None)
    cut_extrude3_tool6 = split(extrude(cut_extrude3_sk6.sketch, amount=-CUT_EXTRUDE3_REACH, mode=Mode.PRIVATE), bisect_by=cut_extrude3_end, keep=Keep.BOTH, mode=Mode.PRIVATE)
    add(cut_extrude3_tool1.solids().sort_by(Axis((86.151001, 38.75, 36.57963), (0, 1, 0)))[0], mode=Mode.SUBTRACT)
    add(cut_extrude3_tool2.solids().sort_by(Axis((92.272705, 38.75, 30.500054), (0, 1, 0)))[0], mode=Mode.SUBTRACT)
    add(cut_extrude3_tool3.solids().sort_by(Axis((100.855212, 38.75, 25.5), (0, 1, 0)))[0], mode=Mode.SUBTRACT)
    add(cut_extrude3_tool4.solids().sort_by(Axis((113.544788, 38.75, 25.5), (0, 1, 0)))[0], mode=Mode.SUBTRACT)
    add(cut_extrude3_tool5.solids().sort_by(Axis((120.775052, 38.75, 21.842883), (0, 1, 0)))[0], mode=Mode.SUBTRACT)
    add(cut_extrude3_tool6.solids().sort_by(Axis((126.258168, 38.75, 16.397501), (0, 1, 0)))[0], mode=Mode.SUBTRACT)

    # Cut-Extrude4: up to this face of the body (flat: up to its plane)
    cut_extrude4_end = Plane(part.part.faces().sort_by_distance((0, 22.5, 11))[0])
    # Sketch19 → Cut-Extrude4 (cut, up to the picked face)
    with BuildSketch(Plane(origin=(145.7, 0, 0), x_dir=(0, 0, -1), z_dir=(1, 0, 0)), mode=Mode.PRIVATE) as cut_extrude4_sk1:
        Polygon((-22, 43.25), (-20, 45), (-22, 45), align=None)
    cut_extrude4_tool1 = split(extrude(cut_extrude4_sk1.sketch, amount=-CUT_EXTRUDE4_REACH, mode=Mode.PRIVATE), bisect_by=cut_extrude4_end, keep=Keep.BOTH, mode=Mode.PRIVATE)
    # Sketch19 → Cut-Extrude4 (cut, up to the picked face)
    with BuildSketch(Plane(origin=(145.7, 0, 0), x_dir=(0, 0, -1), z_dir=(1, 0, 0)), mode=Mode.PRIVATE) as cut_extrude4_sk2:
        Polygon((-22, 1.75), (-20, 0), (-22, 0), align=None)
    cut_extrude4_tool2 = split(extrude(cut_extrude4_sk2.sketch, amount=-CUT_EXTRUDE4_REACH, mode=Mode.PRIVATE), bisect_by=cut_extrude4_end, keep=Keep.BOTH, mode=Mode.PRIVATE)
    add(cut_extrude4_tool1.solids().sort_by(Axis((145.7, 44.416667, 21.333333), (-1, 0, 0)))[0], mode=Mode.SUBTRACT)
    add(cut_extrude4_tool2.solids().sort_by(Axis((145.7, 0.583333, 21.333333), (-1, 0, 0)))[0], mode=Mode.SUBTRACT)

    # Cut-Extrude5: up to this face of the body (flat: up to its plane)
    cut_extrude5_end = Plane(part.part.faces().sort_by_distance((72.85, 45, 10))[0])
    # Sketch20 → Cut-Extrude5 (cut, up to the picked face)
    with BuildSketch(Plane(origin=(0, 0, 0), x_dir=(-1, 0, 0), z_dir=(0, -1, 0)), mode=Mode.PRIVATE) as cut_extrude5_sk1:
        Polygon((-143.95, -22), (-145.7, -20), (-145.7, -22), align=None)
    cut_extrude5_tool1 = split(extrude(cut_extrude5_sk1.sketch, amount=-CUT_EXTRUDE5_REACH, mode=Mode.PRIVATE), bisect_by=cut_extrude5_end, keep=Keep.BOTH, mode=Mode.PRIVATE)
    # Sketch20 → Cut-Extrude5 (cut, up to the picked face)
    with BuildSketch(Plane(origin=(0, 0, 0), x_dir=(-1, 0, 0), z_dir=(0, -1, 0)), mode=Mode.PRIVATE) as cut_extrude5_sk2:
        Polygon((-1.75, -22), (0, -20), (0, -22), align=None)
    cut_extrude5_tool2 = split(extrude(cut_extrude5_sk2.sketch, amount=-CUT_EXTRUDE5_REACH, mode=Mode.PRIVATE), bisect_by=cut_extrude5_end, keep=Keep.BOTH, mode=Mode.PRIVATE)
    add(cut_extrude5_tool1.solids().sort_by(Axis((145.116667, 0, 21.333333), (0, 1, 0)))[0], mode=Mode.SUBTRACT)
    add(cut_extrude5_tool2.solids().sort_by(Axis((0.583333, 0, 21.333333), (0, 1, 0)))[0], mode=Mode.SUBTRACT)

    # Cut-Extrude6: up to this face of the body (flat: up to its plane)
    cut_extrude6_end = Plane(part.part.faces().sort_by_distance((145.7, 22.5, 10))[0])
    # Sketch21 → Cut-Extrude6 (cut, up to the picked face)
    with BuildSketch(Plane.ZY, mode=Mode.PRIVATE) as cut_extrude6_sk1:
        with Locations(Location((10, 22.5, 0), (0, 0, 180))):
            Circle(SKETCH21_R)
    cut_extrude6_tool1 = split(extrude(cut_extrude6_sk1.sketch, amount=-CUT_EXTRUDE6_REACH, mode=Mode.PRIVATE), bisect_by=cut_extrude6_end, keep=Keep.BOTH, mode=Mode.PRIVATE)
    add(cut_extrude6_tool1.solids().sort_by(Axis((0, 22.5, 10), (1, 0, 0)))[0], mode=Mode.SUBTRACT)


solid = part.part
